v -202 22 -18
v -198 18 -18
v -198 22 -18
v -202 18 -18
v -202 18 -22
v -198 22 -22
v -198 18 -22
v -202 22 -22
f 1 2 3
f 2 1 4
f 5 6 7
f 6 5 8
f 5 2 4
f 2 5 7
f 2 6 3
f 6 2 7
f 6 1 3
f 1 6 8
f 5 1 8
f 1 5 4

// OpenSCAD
// file: lib/stores_clearance.scad
// ISM-FJ-1 adjacent-store clearance envelopes — A4 #122
// Study mm. Inert fit / clearance only — no release kinematics.
// Library modules only.

fuselage_length = 420;
function fs_x(pct) = fuselage_length * pct;

// Station BL/WL from hardpoints.yaml; store body = study-scaled class cylinder
// Full-scale AAM-S ~2.9 m × 0.127 m → study ≈ /36.9 → L~79 mm, D~3.4 mm
// Use exaggerated study envelopes for clash visibility at wing stations.

module store_envelope(bl, wl, fs_pct, dia = 8, len = 60) {
    translate([fs_x(fs_pct) - len / 2, bl, wl - dia / 2])
        rotate([0, 90, 0])
            cylinder(h = len, d = dia, $fn = 24);
}

// Tip + outboard adjacent pair (left wing) at max flap/gear deflection stub:
// deflect BL 3 mm toward neighbor to stress clearance gap.
module adjacent_pair_sta1_sta3(deflect_mm = 3) {
    store_envelope(-140 + deflect_mm, -6, 0.58, 8, 60);  // STA-1
    store_envelope(-105 - deflect_mm, -8, 0.60, 10, 70); // STA-3
}

module adjacent_pair_sta3_sta5(deflect_mm = 3) {
    store_envelope(-105 + deflect_mm, -8, 0.60, 10, 70);
    store_envelope(-70 - deflect_mm, -10, 0.61, 12, 80);
}

module adjacent_pair_sta5_sta7(deflect_mm = 3) {
    store_envelope(-70 + deflect_mm, -10, 0.61, 12, 80);
    store_envelope(-35 - deflect_mm, -12, 0.62, 14, 90);
}

module adjacent_pair_sta7_sta9(deflect_mm = 3) {
    store_envelope(-35 + deflect_mm, -12, 0.62, 14, 90);
    store_envelope(0, -28, 0.55, 16, 100);  // STA-9 CL
}

module pair_intersection_1_3() {
    intersection() {
        store_envelope(-140 + 3, -6, 0.58, 8, 60);
        store_envelope(-105 - 3, -8, 0.60, 10, 70);
    }
}

module pair_intersection_3_5() {
    intersection() {
        store_envelope(-105 + 3, -8, 0.60, 10, 70);
        store_envelope(-70 - 3, -10, 0.61, 12, 80);
    }
}

module pair_intersection_5_7() {
    intersection() {
        store_envelope(-70 + 3, -10, 0.61, 12, 80);
        store_envelope(-35 - 3, -12, 0.62, 14, 90);
    }
}

module pair_intersection_7_9() {
    intersection() {
        store_envelope(-35 + 3, -12, 0.62, 14, 90);
        store_envelope(0, -28, 0.55, 16, 100);
    }
}

module all_adjacent_forbidden_intersections() {
    union() {
        pair_intersection_1_3();
        pair_intersection_3_5();
        pair_intersection_5_7();
        pair_intersection_7_9();
    }
}
// main file
// A4 #122 — adjacent store clearance (cad-verify compatible).
// Witness cube; emptiness via check_stores_clearance.sh.

include <lib/stores_clearance.scad>

echo("A4 #122: adjacent store ∩ at max deflection must be empty; witness for CI.");
echo("A4 #122: run shell/check_stores_clearance.sh");

translate([-200, 20, -20])
    cube(4, center = true);
